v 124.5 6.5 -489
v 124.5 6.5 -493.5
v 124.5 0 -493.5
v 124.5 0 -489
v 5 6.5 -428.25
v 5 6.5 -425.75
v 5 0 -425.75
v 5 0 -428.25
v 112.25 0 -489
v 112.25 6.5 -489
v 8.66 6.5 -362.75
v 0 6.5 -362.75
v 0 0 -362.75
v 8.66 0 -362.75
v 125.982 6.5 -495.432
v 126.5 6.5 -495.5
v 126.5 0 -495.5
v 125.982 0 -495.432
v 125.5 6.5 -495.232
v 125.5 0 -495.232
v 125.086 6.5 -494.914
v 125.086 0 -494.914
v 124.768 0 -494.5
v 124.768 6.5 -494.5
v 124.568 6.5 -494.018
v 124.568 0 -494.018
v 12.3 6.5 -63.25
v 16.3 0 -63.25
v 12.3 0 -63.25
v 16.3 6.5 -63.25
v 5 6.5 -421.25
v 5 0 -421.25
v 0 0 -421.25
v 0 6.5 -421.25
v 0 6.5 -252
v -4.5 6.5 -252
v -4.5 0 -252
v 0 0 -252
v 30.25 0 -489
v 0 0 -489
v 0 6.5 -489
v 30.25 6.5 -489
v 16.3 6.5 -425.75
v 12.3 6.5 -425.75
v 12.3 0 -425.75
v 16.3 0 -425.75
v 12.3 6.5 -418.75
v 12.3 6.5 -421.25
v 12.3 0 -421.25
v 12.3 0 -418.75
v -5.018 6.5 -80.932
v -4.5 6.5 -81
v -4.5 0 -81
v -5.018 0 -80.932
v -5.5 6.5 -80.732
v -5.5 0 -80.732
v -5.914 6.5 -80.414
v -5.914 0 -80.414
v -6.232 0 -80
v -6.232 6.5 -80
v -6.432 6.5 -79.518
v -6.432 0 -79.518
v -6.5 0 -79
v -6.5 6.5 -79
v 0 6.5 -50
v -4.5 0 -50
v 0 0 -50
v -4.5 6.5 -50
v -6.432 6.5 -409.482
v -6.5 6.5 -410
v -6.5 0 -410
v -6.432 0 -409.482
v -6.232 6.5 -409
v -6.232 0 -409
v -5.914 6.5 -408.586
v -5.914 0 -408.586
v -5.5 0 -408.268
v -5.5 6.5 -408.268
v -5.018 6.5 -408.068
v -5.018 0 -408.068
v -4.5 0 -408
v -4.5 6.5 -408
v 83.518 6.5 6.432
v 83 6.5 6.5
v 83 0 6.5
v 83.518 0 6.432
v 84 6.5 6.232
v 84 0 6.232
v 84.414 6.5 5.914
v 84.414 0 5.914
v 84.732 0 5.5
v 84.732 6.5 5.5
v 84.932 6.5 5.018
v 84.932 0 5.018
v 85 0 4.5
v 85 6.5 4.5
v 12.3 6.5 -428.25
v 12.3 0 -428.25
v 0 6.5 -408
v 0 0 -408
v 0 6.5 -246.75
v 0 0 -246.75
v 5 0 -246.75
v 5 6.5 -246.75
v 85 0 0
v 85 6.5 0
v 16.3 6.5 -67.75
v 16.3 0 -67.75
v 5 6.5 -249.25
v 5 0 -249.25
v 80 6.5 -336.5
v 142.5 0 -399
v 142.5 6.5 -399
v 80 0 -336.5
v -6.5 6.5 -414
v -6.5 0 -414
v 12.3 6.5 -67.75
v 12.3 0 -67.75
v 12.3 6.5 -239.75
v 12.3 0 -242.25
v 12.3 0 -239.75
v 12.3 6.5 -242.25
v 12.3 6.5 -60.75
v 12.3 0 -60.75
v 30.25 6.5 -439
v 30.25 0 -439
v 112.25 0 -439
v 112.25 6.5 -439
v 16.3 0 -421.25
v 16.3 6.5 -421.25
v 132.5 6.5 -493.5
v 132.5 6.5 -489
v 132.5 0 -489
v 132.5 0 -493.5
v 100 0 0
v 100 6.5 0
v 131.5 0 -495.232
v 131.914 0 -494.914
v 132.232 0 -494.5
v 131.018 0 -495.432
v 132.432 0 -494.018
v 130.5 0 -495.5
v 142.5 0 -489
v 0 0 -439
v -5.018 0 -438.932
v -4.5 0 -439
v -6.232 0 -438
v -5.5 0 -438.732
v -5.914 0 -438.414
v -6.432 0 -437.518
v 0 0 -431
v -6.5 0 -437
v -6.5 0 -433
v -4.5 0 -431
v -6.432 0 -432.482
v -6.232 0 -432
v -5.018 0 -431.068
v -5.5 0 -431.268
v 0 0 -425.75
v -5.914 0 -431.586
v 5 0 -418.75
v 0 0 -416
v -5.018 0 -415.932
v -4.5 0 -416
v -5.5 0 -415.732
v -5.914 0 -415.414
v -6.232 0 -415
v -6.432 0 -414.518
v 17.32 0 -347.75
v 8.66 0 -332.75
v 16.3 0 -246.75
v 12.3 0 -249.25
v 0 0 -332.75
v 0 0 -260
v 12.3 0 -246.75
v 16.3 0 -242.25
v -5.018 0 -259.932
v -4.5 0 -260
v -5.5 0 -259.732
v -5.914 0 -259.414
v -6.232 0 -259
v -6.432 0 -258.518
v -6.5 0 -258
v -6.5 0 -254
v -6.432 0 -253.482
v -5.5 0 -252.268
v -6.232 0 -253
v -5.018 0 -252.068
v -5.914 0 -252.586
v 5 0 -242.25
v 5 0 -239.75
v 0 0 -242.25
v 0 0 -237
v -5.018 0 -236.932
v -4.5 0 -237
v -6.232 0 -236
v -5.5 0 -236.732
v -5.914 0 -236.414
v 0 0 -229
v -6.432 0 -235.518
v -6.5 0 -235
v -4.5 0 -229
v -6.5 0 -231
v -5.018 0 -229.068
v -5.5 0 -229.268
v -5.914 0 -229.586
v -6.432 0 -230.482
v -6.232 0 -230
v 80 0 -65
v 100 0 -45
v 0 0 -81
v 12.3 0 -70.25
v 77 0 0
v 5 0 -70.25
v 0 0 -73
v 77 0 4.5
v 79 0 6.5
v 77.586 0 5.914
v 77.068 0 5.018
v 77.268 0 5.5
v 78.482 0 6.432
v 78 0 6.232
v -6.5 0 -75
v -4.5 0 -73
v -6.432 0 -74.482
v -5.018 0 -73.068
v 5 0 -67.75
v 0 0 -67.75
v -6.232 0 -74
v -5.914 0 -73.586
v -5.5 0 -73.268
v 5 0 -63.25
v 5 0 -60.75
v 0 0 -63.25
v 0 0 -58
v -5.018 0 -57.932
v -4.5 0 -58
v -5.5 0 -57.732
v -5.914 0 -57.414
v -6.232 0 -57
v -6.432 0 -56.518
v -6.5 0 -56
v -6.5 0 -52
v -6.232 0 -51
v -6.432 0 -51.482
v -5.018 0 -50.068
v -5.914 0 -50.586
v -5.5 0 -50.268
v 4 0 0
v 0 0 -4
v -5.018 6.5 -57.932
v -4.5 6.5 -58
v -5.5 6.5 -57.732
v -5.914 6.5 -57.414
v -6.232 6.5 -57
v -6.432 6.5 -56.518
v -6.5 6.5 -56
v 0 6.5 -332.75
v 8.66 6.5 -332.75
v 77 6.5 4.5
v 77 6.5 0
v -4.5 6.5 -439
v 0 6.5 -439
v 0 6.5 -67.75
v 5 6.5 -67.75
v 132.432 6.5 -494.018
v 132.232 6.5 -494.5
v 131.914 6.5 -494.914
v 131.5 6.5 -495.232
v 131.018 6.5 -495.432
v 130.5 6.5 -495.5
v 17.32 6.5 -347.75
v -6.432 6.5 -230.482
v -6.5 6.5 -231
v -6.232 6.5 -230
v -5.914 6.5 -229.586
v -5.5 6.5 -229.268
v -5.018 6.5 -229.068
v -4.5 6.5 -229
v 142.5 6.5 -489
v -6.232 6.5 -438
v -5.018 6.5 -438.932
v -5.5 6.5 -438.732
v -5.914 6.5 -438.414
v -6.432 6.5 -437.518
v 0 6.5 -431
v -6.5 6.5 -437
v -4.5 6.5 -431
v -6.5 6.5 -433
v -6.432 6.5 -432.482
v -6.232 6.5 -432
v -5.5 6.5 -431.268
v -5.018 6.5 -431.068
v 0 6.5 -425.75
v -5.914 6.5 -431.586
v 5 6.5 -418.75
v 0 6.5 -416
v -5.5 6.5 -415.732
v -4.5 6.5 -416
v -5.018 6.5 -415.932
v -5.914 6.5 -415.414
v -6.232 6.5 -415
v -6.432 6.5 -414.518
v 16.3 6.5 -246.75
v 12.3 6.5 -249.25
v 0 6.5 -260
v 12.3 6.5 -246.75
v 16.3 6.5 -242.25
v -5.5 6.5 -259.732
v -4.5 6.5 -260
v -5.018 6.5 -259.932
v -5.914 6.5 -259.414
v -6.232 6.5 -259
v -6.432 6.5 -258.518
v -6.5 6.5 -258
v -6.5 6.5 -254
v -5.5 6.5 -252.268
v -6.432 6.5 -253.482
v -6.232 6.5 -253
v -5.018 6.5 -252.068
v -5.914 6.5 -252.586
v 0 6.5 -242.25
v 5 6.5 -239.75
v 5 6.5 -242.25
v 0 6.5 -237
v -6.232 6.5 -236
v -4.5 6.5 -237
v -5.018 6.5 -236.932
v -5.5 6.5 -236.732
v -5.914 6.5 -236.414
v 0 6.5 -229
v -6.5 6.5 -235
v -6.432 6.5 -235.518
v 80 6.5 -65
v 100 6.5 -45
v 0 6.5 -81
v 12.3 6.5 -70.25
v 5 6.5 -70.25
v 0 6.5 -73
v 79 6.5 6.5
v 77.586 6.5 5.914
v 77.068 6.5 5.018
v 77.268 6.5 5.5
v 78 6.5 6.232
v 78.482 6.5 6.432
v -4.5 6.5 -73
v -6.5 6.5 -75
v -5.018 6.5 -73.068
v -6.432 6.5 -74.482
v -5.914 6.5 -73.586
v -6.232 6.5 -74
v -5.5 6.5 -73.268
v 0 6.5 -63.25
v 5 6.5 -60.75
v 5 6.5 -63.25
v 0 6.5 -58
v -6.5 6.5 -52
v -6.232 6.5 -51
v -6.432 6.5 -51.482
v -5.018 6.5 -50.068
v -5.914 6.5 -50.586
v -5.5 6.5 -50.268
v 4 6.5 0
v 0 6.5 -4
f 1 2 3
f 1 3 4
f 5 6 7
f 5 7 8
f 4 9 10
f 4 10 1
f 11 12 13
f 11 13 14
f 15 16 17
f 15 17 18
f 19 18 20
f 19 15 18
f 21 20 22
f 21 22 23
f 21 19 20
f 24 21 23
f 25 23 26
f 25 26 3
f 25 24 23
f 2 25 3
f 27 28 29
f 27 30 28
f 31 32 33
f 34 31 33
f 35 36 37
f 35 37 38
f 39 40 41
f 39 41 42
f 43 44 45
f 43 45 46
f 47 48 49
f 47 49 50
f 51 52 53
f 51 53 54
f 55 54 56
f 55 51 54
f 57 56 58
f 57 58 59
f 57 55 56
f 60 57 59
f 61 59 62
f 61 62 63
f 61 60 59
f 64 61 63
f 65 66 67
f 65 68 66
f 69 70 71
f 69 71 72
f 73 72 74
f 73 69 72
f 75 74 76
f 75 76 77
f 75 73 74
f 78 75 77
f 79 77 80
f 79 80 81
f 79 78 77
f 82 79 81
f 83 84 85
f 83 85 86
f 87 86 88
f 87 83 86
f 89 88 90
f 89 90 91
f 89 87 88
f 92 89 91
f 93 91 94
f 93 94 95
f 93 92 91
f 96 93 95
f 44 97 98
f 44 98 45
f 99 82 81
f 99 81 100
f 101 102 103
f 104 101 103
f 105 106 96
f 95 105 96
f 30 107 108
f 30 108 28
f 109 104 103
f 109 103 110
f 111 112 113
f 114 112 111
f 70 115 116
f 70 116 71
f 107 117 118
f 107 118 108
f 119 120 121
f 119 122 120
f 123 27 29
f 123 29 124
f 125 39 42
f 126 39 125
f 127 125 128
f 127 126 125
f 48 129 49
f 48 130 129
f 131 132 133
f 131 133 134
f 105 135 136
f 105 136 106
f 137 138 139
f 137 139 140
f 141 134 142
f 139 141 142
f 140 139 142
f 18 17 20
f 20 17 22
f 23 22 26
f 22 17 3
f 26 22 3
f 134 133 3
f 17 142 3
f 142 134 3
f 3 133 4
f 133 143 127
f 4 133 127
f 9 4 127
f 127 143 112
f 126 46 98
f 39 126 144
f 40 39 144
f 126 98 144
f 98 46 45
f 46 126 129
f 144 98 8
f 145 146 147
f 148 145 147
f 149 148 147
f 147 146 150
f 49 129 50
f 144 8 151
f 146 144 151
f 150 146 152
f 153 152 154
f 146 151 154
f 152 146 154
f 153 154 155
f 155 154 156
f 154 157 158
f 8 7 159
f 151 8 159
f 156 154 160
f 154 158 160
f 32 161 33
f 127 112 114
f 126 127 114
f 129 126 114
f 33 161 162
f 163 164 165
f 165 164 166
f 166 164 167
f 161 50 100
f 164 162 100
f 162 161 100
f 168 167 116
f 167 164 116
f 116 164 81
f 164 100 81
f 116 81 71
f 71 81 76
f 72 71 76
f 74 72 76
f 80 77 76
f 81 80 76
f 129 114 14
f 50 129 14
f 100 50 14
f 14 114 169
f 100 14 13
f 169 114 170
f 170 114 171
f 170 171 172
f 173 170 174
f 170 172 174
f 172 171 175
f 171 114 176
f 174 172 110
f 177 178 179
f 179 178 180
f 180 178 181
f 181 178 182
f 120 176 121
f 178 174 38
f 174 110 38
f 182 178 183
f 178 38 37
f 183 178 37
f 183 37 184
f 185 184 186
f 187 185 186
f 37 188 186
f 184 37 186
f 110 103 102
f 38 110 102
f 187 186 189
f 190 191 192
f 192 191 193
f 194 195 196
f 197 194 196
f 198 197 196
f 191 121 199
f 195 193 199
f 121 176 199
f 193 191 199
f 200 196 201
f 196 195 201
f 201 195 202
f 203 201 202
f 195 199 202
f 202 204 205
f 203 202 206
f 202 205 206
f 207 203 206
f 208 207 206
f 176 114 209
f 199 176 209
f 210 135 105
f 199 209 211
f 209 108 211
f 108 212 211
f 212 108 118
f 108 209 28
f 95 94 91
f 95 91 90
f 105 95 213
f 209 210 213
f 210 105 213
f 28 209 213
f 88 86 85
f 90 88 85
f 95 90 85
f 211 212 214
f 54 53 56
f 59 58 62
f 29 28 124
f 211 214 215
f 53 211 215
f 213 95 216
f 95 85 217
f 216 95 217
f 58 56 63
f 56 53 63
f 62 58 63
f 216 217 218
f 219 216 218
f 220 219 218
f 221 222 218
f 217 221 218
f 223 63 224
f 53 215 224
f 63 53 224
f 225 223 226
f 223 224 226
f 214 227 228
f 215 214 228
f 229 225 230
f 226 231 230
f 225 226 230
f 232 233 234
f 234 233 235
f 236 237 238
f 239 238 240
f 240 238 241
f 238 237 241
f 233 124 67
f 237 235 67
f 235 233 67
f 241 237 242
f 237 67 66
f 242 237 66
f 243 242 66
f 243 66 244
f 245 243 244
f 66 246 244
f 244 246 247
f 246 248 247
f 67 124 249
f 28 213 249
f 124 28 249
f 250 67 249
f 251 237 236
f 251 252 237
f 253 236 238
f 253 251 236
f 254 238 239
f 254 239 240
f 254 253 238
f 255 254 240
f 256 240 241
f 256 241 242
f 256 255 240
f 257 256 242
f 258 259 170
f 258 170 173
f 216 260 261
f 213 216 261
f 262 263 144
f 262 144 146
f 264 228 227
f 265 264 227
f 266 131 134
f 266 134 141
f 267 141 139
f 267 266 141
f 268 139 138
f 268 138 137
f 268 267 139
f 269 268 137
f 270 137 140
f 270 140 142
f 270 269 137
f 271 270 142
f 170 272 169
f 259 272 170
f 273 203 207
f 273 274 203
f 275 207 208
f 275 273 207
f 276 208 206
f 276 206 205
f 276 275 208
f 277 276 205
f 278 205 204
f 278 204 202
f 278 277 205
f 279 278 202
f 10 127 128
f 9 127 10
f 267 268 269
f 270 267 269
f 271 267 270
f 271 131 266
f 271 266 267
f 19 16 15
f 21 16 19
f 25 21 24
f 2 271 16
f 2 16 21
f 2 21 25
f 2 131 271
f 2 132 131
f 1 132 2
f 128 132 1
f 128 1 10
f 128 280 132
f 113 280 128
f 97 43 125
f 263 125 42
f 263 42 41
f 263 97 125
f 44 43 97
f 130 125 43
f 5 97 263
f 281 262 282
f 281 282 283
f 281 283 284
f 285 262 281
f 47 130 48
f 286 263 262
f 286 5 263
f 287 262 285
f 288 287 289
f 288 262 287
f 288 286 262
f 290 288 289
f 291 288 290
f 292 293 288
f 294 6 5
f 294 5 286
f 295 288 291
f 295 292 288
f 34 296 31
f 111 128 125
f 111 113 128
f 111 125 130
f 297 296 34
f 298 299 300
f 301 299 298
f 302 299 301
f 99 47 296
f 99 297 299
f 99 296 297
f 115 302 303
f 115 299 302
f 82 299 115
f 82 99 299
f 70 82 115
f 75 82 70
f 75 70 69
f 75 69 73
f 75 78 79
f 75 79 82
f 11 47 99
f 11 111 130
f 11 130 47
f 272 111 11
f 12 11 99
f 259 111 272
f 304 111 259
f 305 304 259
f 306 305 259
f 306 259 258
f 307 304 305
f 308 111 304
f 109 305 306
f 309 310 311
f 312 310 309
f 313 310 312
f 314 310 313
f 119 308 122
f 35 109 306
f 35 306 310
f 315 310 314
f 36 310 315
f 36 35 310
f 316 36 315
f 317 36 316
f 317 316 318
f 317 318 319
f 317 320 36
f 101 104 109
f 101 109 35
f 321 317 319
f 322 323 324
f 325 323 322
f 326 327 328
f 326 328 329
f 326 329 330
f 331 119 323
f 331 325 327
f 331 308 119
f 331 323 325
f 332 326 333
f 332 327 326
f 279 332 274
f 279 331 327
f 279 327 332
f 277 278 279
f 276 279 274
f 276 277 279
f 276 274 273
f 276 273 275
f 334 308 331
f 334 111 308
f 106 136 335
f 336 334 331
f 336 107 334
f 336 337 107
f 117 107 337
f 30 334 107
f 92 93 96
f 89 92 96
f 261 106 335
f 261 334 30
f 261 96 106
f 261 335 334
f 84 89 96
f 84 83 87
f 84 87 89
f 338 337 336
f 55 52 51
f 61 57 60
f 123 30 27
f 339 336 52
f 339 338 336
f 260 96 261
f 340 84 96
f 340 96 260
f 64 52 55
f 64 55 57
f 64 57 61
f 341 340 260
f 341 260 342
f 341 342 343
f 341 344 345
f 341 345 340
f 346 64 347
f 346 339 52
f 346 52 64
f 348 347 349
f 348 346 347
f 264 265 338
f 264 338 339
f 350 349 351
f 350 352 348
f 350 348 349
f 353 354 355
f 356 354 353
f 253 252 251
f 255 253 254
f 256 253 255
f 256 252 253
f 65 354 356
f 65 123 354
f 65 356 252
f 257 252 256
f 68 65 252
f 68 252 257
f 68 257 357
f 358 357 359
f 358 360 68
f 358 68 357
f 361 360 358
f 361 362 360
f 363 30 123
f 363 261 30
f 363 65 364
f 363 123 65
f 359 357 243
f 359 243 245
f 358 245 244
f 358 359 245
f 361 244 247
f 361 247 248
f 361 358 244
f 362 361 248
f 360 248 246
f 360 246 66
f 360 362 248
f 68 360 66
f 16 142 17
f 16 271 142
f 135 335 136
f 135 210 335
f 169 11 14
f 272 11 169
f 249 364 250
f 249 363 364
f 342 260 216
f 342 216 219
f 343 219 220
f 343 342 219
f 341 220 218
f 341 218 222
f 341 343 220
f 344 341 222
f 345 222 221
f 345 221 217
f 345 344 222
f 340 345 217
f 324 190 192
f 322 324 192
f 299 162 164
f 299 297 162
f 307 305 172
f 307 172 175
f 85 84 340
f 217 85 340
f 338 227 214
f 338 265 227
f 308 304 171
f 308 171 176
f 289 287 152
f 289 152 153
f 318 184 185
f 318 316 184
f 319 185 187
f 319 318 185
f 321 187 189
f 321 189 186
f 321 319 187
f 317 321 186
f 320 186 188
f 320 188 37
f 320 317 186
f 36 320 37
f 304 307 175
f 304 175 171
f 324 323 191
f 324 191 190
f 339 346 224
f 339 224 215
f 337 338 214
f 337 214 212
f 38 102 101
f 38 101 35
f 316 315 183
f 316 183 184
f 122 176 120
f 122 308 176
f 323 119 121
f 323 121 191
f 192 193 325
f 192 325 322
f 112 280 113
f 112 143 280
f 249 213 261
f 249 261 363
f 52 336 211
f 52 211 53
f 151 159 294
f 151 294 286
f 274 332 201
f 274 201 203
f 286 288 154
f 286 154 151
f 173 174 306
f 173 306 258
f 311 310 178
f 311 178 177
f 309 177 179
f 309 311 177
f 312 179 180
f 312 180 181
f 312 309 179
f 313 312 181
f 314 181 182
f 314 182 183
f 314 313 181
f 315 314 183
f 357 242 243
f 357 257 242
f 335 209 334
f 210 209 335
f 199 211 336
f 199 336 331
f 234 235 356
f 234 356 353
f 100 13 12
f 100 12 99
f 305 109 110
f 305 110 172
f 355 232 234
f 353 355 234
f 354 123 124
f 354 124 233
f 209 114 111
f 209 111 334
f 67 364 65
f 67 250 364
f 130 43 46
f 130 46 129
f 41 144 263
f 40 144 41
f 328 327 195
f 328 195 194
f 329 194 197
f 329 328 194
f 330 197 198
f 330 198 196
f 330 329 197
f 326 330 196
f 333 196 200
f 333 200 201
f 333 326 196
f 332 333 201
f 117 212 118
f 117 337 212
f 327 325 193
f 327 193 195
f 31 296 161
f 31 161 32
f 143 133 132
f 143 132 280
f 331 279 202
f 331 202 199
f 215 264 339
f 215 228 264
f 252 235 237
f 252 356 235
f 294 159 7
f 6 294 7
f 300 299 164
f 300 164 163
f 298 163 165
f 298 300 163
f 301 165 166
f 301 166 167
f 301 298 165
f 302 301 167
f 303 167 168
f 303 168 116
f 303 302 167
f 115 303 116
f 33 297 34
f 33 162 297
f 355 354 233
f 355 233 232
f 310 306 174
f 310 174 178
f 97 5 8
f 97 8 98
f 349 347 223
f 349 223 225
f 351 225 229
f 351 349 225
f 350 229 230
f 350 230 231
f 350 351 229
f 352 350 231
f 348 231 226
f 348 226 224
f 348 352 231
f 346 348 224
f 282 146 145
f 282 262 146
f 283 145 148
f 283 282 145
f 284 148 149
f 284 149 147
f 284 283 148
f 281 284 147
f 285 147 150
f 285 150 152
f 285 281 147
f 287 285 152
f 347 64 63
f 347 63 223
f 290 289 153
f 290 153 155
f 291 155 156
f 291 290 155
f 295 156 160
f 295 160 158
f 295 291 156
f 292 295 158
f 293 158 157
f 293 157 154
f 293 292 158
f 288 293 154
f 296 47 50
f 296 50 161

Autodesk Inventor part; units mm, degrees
ref_plane "YZ Plane" through (0, 0, 0) normal (1, 0, 0) x (0, 1, 0)
ref_plane "XZ Plane" through (0, 0, 0) normal (0, 1, 0) x (-1, 0, 0)
ref_plane "XY Plane" through (0, 0, 0) normal (0, 0, 1) x (1, 0, 0)
sketch "Sketch1" plane through (0, 0, 0) normal (0, 1, 0) x (-1, 0, 0)
  line L0 (0, 0) -> (0, -489)
  line L1 (0, -489) -> (-30.25, -489)
  line L2 (-30.25, -489) -> (-30.25, -439)
  line L3 (-30.25, -439) -> (-112.25, -439)
  line L4 (-112.25, -439) -> (-112.25, -489)
  line L5 (-112.25, -489) -> (-142.5, -489)
  line L6 (-142.5, -489) -> (-142.5, -399)
  line L7 (-142.5, -399) -> (-80, -336.5)
  line L8 (-80, -336.5) -> (-80, -65)
  line L9 (-80, -65) -> (-100, -45)
  line L10 (-100, -45) -> (-100, 0)
  line L11 (-100, 0) -> (0, 0)
  dimension "d0" = 135
  dimension "d1" = 100
  dimension "d2" = 489
  dimension "d3" = 45
  dimension "d4" = 20
  dimension "d5" = 30.25
  dimension "d6" = 50
  dimension "d7" = 82
  dimension "d8" = 40
extrude "Extrusion1" add sketch "Sketch1" along normal blind 6.5
sketch "Sketch2" plane through (0, 6.5, 0) normal (0, 1, 0) x (1, 0, 0)
  line L0 (0, 0) -> (100, 0) projected
  line L1 (30.25, 489) -> (0, 489) projected
  line L2 (0, 489) -> (0, 0) projected
  line L3 (16.3, 425.75) -> (16.3, 421.25)
  line L4 (0, 421.25) -> (0, 425.75)
  line L5 (5, 428.25) -> (12.3, 428.25)
  line L6 (12.3, 418.75) -> (5, 418.75)
  line L7 (0, 425.75) -> (5, 425.75)
  line L8 (12.3, 425.75) -> (16.3, 425.75)
  line L9 (16.3, 421.25) -> (12.3, 421.25)
  line L10 (5, 421.25) -> (0, 421.25)
  line L11 (5, 418.75) -> (5, 421.25)
  line L12 (5, 425.75) -> (5, 428.25)
  line L13 (12.3, 428.25) -> (12.3, 425.75)
  line L14 (12.3, 421.25) -> (12.3, 418.75)
  line L15 (16.3, 246.75) -> (16.3, 242.25)
  line L16 (0, 242.25) -> (0, 246.75)
  line L17 (5, 249.25) -> (12.3, 249.25)
  line L18 (12.3, 239.75) -> (5, 239.75)
  line L19 (0, 246.75) -> (5, 246.75)
  line L20 (12.3, 246.75) -> (16.3, 246.75)
  line L21 (16.3, 242.25) -> (12.3, 242.25)
  line L22 (5, 242.25) -> (0, 242.25)
  line L23 (5, 239.75) -> (5, 242.25)
  line L24 (5, 246.75) -> (5, 249.25)
  line L25 (12.3, 249.25) -> (12.3, 246.75)
  line L26 (12.3, 242.25) -> (12.3, 239.75)
  line L27 (16.3, 67.75) -> (16.3, 63.25)
  line L28 (0, 63.25) -> (0, 67.75)
  line L29 (5, 70.25) -> (12.3, 70.25)
  line L30 (12.3, 60.75) -> (5, 60.75)
  line L31 (0, 67.75) -> (5, 67.75)
  line L32 (12.3, 67.75) -> (16.3, 67.75)
  line L33 (16.3, 63.25) -> (12.3, 63.25)
  line L34 (5, 63.25) -> (0, 63.25)
  line L35 (5, 60.75) -> (5, 63.25)
  line L36 (5, 67.75) -> (5, 70.25)
  line L37 (12.3, 70.25) -> (12.3, 67.75)
  line L38 (12.3, 63.25) -> (12.3, 60.75)
  line L39 (8.65, 418.75) -> (8.65, 249.25) construction
  line L40 (8.65, 239.75) -> (8.65, 70.25) construction
  point P0 (16.3, 423.5)
  point P1 (16.3, 244.5)
  point P2 (16.3, 65.5)
  dimension "d11" = 4.5
  dimension "d12" = 5
  dimension "d13" = 4
  dimension "d14" = 7.3
  dimension "d15" = 2.5
  dimension "d16" = 4.5
  dimension "d17" = 5
  dimension "d18" = 4
  dimension "d19" = 7.3
  dimension "d20" = 2.5
  dimension "d21" = 4.5
  dimension "d22" = 5
  dimension "d23" = 4
  dimension "d24" = 7.3
  dimension "d25" = 2.5
  dimension "d26" = 65.5
  dimension "d27" = 65.5
extrude "Extrusion2" cut sketch "Sketch2" against normal through all
sketch "Sketch3" plane through (0, 6.5, 0) normal (0, 1, 0) x (1, 0, 0)
  line L0 (0, 242.25) -> (0, 67.75) projected
  line L1 (16.3, 67.75) -> (16.3, 63.25) projected
  line L2 (0, 63.25) -> (0, 0) projected
  line L3 (0, 489) -> (0, 425.75) projected
  line L4 (16.3, 425.75) -> (16.3, 421.25) projected
  line L5 (0, 421.25) -> (0, 246.75) projected
  line L6 (16.3, 246.75) -> (16.3, 242.25) projected
  line L7 (0, 439) -> (-4.5, 439)
  line L8 (-6.5, 437) -> (-6.5, 433)
  line L9 (-4.5, 431) -> (0, 431)
  line L10 (0, 431) -> (0, 439)
  line L11 (0, 416) -> (-4.5, 416)
  line L12 (-6.5, 414) -> (-6.5, 410)
  line L13 (-4.5, 408) -> (0, 408)
  line L14 (0, 408) -> (0, 416)
  line L15 (0, 260) -> (-4.5, 260)
  line L16 (-6.5, 258) -> (-6.5, 254)
  line L17 (-4.5, 252) -> (0, 252)
  line L18 (0, 252) -> (0, 260)
  line L19 (0, 237) -> (-4.5, 237)
  line L20 (-6.5, 235) -> (-6.5, 231)
  line L21 (-4.5, 229) -> (0, 229)
  line L22 (0, 229) -> (0, 237)
  line L23 (0, 81) -> (-4.5, 81)
  line L24 (-6.5, 79) -> (-6.5, 75)
  line L25 (-4.5, 73) -> (0, 73)
  line L26 (0, 73) -> (0, 81)
  line L27 (0, 58) -> (-4.5, 58)
  line L28 (-6.5, 56) -> (-6.5, 52)
  line L29 (-4.5, 50) -> (0, 50)
  line L30 (0, 50) -> (0, 58)
  arc A0 (-4.5, 439) -> (-6.5, 437) centre (-4.5, 437) ccw
  arc A1 (-6.5, 433) -> (-4.5, 431) centre (-4.5, 433) ccw
  arc A2 (-4.5, 416) -> (-6.5, 414) centre (-4.5, 414) ccw
  arc A3 (-6.5, 410) -> (-4.5, 408) centre (-4.5, 410) ccw
  arc A4 (-4.5, 260) -> (-6.5, 258) centre (-4.5, 258) ccw
  arc A5 (-6.5, 254) -> (-4.5, 252) centre (-4.5, 254) ccw
  arc A6 (-4.5, 237) -> (-6.5, 235) centre (-4.5, 235) ccw
  arc A7 (-6.5, 231) -> (-4.5, 229) centre (-4.5, 231) ccw
  arc A8 (-4.5, 81) -> (-6.5, 79) centre (-4.5, 79) ccw
  arc A9 (-6.5, 75) -> (-4.5, 73) centre (-4.5, 75) ccw
  arc A10 (-4.5, 58) -> (-6.5, 56) centre (-4.5, 56) ccw
  arc A11 (-6.5, 52) -> (-4.5, 50) centre (-4.5, 52) ccw
  point P0 (16.3, 423.5)
  point P1 (16.3, 244.5)
  point P2 (16.3, 65.5)
  dimension "d30" = 2
  dimension "d31" = 8
  dimension "d32" = 8
  dimension "d33" = 15
  dimension "d34" = 8
  dimension "d35" = 8
  dimension "d36" = 15
  dimension "d37" = 8
  dimension "d38" = 8
  dimension "d39" = 15
  dimension "d40" = 7.5
  dimension "d41" = 7.5
  dimension "d42" = 7.5
  dimension "d43" = 6.5
extrude "Extrusion3" add sketch "Sketch3" against normal blind 6.5
sketch "Sketch4" plane through (0, 6.5, 0) normal (0, 1, 0) x (1, 0, 0)
  line L0 (0, 0) -> (100, 0) projected
  line L1 (100, 0) -> (100, 45) projected
  line L2 (142.5, 399) -> (142.5, 489) projected
  line L3 (142.5, 489) -> (112.25, 489) projected
  line L4 (77, 0) -> (85, 0)
  line L5 (85, 0) -> (85, -4.5)
  line L6 (83, -6.5) -> (79, -6.5)
  line L7 (77, -4.5) -> (77, 0)
  line L8 (124.5, 489) -> (132.5, 489)
  line L9 (132.5, 489) -> (132.5, 493.5)
  line L10 (130.5, 495.5) -> (126.5, 495.5)
  line L11 (124.5, 493.5) -> (124.5, 489)
  arc A0 (126.5, 495.5) -> (124.5, 493.5) centre (126.5, 493.5) ccw
  arc A1 (132.5, 493.5) -> (130.5, 495.5) centre (130.5, 493.5) ccw
  arc A2 (83, -6.5) -> (85, -4.5) centre (83, -4.5) ccw
  arc A3 (77, -4.5) -> (79, -6.5) centre (79, -4.5) ccw
  dimension "d46" = 2
  dimension "d47" = 8
  dimension "d48" = 6.5
  dimension "d49" = 15
  dimension "d50" = 8
  dimension "d51" = 6.5
  dimension "d52" = 10
extrude "Extrusion4" add sketch "Sketch4" against normal blind 6.5
sketch "Sketch5" plane through (0, 6.5, 0) normal (0, 1, 0) x (1, 0, 0)
  line L0 (30.25, 489) -> (0, 489) projected
  line L1 (0, 408) -> (0, 260) projected
  line L2 (8.6603, 332.75) -> (0, 332.75)
  line L3 (0, 362.75) -> (8.6603, 362.75)
  line L4 (8.6603, 362.75) -> (17.3205, 347.75)
  line L5 (17.3205, 347.75) -> (8.6603, 332.75)
  line L6 (0, 362.75) -> (0, 332.75)
  point P0 (0, 347.75)
  dimension "d55" = 30
  dimension "d56" = 156.25
extrude "Extrusion5" cut sketch "Sketch5" against normal through all
chamfer "Chamfer1" distance 4 angle 45 1 edges at (0, 3.25, 0)
equation "\"d27\" = d26"
equation "\"d32\" = d31"
equation "\"d34\" = d32"
equation "\"d35\" = d34"
equation "\"d36\" = d33"
equation "\"d37\" = d35"
equation "\"d38\" = d37"
equation "\"d39\" = d36"
equation "\"d40\" = 0.5 * d39"
equation "\"d41\" = d40"
equation "\"d42\" = d41"
equation "\"d50\" = d47"
equation "\"d51\" = d48"
properties part number "inner_brace_left" material "Plywood, Finish"
